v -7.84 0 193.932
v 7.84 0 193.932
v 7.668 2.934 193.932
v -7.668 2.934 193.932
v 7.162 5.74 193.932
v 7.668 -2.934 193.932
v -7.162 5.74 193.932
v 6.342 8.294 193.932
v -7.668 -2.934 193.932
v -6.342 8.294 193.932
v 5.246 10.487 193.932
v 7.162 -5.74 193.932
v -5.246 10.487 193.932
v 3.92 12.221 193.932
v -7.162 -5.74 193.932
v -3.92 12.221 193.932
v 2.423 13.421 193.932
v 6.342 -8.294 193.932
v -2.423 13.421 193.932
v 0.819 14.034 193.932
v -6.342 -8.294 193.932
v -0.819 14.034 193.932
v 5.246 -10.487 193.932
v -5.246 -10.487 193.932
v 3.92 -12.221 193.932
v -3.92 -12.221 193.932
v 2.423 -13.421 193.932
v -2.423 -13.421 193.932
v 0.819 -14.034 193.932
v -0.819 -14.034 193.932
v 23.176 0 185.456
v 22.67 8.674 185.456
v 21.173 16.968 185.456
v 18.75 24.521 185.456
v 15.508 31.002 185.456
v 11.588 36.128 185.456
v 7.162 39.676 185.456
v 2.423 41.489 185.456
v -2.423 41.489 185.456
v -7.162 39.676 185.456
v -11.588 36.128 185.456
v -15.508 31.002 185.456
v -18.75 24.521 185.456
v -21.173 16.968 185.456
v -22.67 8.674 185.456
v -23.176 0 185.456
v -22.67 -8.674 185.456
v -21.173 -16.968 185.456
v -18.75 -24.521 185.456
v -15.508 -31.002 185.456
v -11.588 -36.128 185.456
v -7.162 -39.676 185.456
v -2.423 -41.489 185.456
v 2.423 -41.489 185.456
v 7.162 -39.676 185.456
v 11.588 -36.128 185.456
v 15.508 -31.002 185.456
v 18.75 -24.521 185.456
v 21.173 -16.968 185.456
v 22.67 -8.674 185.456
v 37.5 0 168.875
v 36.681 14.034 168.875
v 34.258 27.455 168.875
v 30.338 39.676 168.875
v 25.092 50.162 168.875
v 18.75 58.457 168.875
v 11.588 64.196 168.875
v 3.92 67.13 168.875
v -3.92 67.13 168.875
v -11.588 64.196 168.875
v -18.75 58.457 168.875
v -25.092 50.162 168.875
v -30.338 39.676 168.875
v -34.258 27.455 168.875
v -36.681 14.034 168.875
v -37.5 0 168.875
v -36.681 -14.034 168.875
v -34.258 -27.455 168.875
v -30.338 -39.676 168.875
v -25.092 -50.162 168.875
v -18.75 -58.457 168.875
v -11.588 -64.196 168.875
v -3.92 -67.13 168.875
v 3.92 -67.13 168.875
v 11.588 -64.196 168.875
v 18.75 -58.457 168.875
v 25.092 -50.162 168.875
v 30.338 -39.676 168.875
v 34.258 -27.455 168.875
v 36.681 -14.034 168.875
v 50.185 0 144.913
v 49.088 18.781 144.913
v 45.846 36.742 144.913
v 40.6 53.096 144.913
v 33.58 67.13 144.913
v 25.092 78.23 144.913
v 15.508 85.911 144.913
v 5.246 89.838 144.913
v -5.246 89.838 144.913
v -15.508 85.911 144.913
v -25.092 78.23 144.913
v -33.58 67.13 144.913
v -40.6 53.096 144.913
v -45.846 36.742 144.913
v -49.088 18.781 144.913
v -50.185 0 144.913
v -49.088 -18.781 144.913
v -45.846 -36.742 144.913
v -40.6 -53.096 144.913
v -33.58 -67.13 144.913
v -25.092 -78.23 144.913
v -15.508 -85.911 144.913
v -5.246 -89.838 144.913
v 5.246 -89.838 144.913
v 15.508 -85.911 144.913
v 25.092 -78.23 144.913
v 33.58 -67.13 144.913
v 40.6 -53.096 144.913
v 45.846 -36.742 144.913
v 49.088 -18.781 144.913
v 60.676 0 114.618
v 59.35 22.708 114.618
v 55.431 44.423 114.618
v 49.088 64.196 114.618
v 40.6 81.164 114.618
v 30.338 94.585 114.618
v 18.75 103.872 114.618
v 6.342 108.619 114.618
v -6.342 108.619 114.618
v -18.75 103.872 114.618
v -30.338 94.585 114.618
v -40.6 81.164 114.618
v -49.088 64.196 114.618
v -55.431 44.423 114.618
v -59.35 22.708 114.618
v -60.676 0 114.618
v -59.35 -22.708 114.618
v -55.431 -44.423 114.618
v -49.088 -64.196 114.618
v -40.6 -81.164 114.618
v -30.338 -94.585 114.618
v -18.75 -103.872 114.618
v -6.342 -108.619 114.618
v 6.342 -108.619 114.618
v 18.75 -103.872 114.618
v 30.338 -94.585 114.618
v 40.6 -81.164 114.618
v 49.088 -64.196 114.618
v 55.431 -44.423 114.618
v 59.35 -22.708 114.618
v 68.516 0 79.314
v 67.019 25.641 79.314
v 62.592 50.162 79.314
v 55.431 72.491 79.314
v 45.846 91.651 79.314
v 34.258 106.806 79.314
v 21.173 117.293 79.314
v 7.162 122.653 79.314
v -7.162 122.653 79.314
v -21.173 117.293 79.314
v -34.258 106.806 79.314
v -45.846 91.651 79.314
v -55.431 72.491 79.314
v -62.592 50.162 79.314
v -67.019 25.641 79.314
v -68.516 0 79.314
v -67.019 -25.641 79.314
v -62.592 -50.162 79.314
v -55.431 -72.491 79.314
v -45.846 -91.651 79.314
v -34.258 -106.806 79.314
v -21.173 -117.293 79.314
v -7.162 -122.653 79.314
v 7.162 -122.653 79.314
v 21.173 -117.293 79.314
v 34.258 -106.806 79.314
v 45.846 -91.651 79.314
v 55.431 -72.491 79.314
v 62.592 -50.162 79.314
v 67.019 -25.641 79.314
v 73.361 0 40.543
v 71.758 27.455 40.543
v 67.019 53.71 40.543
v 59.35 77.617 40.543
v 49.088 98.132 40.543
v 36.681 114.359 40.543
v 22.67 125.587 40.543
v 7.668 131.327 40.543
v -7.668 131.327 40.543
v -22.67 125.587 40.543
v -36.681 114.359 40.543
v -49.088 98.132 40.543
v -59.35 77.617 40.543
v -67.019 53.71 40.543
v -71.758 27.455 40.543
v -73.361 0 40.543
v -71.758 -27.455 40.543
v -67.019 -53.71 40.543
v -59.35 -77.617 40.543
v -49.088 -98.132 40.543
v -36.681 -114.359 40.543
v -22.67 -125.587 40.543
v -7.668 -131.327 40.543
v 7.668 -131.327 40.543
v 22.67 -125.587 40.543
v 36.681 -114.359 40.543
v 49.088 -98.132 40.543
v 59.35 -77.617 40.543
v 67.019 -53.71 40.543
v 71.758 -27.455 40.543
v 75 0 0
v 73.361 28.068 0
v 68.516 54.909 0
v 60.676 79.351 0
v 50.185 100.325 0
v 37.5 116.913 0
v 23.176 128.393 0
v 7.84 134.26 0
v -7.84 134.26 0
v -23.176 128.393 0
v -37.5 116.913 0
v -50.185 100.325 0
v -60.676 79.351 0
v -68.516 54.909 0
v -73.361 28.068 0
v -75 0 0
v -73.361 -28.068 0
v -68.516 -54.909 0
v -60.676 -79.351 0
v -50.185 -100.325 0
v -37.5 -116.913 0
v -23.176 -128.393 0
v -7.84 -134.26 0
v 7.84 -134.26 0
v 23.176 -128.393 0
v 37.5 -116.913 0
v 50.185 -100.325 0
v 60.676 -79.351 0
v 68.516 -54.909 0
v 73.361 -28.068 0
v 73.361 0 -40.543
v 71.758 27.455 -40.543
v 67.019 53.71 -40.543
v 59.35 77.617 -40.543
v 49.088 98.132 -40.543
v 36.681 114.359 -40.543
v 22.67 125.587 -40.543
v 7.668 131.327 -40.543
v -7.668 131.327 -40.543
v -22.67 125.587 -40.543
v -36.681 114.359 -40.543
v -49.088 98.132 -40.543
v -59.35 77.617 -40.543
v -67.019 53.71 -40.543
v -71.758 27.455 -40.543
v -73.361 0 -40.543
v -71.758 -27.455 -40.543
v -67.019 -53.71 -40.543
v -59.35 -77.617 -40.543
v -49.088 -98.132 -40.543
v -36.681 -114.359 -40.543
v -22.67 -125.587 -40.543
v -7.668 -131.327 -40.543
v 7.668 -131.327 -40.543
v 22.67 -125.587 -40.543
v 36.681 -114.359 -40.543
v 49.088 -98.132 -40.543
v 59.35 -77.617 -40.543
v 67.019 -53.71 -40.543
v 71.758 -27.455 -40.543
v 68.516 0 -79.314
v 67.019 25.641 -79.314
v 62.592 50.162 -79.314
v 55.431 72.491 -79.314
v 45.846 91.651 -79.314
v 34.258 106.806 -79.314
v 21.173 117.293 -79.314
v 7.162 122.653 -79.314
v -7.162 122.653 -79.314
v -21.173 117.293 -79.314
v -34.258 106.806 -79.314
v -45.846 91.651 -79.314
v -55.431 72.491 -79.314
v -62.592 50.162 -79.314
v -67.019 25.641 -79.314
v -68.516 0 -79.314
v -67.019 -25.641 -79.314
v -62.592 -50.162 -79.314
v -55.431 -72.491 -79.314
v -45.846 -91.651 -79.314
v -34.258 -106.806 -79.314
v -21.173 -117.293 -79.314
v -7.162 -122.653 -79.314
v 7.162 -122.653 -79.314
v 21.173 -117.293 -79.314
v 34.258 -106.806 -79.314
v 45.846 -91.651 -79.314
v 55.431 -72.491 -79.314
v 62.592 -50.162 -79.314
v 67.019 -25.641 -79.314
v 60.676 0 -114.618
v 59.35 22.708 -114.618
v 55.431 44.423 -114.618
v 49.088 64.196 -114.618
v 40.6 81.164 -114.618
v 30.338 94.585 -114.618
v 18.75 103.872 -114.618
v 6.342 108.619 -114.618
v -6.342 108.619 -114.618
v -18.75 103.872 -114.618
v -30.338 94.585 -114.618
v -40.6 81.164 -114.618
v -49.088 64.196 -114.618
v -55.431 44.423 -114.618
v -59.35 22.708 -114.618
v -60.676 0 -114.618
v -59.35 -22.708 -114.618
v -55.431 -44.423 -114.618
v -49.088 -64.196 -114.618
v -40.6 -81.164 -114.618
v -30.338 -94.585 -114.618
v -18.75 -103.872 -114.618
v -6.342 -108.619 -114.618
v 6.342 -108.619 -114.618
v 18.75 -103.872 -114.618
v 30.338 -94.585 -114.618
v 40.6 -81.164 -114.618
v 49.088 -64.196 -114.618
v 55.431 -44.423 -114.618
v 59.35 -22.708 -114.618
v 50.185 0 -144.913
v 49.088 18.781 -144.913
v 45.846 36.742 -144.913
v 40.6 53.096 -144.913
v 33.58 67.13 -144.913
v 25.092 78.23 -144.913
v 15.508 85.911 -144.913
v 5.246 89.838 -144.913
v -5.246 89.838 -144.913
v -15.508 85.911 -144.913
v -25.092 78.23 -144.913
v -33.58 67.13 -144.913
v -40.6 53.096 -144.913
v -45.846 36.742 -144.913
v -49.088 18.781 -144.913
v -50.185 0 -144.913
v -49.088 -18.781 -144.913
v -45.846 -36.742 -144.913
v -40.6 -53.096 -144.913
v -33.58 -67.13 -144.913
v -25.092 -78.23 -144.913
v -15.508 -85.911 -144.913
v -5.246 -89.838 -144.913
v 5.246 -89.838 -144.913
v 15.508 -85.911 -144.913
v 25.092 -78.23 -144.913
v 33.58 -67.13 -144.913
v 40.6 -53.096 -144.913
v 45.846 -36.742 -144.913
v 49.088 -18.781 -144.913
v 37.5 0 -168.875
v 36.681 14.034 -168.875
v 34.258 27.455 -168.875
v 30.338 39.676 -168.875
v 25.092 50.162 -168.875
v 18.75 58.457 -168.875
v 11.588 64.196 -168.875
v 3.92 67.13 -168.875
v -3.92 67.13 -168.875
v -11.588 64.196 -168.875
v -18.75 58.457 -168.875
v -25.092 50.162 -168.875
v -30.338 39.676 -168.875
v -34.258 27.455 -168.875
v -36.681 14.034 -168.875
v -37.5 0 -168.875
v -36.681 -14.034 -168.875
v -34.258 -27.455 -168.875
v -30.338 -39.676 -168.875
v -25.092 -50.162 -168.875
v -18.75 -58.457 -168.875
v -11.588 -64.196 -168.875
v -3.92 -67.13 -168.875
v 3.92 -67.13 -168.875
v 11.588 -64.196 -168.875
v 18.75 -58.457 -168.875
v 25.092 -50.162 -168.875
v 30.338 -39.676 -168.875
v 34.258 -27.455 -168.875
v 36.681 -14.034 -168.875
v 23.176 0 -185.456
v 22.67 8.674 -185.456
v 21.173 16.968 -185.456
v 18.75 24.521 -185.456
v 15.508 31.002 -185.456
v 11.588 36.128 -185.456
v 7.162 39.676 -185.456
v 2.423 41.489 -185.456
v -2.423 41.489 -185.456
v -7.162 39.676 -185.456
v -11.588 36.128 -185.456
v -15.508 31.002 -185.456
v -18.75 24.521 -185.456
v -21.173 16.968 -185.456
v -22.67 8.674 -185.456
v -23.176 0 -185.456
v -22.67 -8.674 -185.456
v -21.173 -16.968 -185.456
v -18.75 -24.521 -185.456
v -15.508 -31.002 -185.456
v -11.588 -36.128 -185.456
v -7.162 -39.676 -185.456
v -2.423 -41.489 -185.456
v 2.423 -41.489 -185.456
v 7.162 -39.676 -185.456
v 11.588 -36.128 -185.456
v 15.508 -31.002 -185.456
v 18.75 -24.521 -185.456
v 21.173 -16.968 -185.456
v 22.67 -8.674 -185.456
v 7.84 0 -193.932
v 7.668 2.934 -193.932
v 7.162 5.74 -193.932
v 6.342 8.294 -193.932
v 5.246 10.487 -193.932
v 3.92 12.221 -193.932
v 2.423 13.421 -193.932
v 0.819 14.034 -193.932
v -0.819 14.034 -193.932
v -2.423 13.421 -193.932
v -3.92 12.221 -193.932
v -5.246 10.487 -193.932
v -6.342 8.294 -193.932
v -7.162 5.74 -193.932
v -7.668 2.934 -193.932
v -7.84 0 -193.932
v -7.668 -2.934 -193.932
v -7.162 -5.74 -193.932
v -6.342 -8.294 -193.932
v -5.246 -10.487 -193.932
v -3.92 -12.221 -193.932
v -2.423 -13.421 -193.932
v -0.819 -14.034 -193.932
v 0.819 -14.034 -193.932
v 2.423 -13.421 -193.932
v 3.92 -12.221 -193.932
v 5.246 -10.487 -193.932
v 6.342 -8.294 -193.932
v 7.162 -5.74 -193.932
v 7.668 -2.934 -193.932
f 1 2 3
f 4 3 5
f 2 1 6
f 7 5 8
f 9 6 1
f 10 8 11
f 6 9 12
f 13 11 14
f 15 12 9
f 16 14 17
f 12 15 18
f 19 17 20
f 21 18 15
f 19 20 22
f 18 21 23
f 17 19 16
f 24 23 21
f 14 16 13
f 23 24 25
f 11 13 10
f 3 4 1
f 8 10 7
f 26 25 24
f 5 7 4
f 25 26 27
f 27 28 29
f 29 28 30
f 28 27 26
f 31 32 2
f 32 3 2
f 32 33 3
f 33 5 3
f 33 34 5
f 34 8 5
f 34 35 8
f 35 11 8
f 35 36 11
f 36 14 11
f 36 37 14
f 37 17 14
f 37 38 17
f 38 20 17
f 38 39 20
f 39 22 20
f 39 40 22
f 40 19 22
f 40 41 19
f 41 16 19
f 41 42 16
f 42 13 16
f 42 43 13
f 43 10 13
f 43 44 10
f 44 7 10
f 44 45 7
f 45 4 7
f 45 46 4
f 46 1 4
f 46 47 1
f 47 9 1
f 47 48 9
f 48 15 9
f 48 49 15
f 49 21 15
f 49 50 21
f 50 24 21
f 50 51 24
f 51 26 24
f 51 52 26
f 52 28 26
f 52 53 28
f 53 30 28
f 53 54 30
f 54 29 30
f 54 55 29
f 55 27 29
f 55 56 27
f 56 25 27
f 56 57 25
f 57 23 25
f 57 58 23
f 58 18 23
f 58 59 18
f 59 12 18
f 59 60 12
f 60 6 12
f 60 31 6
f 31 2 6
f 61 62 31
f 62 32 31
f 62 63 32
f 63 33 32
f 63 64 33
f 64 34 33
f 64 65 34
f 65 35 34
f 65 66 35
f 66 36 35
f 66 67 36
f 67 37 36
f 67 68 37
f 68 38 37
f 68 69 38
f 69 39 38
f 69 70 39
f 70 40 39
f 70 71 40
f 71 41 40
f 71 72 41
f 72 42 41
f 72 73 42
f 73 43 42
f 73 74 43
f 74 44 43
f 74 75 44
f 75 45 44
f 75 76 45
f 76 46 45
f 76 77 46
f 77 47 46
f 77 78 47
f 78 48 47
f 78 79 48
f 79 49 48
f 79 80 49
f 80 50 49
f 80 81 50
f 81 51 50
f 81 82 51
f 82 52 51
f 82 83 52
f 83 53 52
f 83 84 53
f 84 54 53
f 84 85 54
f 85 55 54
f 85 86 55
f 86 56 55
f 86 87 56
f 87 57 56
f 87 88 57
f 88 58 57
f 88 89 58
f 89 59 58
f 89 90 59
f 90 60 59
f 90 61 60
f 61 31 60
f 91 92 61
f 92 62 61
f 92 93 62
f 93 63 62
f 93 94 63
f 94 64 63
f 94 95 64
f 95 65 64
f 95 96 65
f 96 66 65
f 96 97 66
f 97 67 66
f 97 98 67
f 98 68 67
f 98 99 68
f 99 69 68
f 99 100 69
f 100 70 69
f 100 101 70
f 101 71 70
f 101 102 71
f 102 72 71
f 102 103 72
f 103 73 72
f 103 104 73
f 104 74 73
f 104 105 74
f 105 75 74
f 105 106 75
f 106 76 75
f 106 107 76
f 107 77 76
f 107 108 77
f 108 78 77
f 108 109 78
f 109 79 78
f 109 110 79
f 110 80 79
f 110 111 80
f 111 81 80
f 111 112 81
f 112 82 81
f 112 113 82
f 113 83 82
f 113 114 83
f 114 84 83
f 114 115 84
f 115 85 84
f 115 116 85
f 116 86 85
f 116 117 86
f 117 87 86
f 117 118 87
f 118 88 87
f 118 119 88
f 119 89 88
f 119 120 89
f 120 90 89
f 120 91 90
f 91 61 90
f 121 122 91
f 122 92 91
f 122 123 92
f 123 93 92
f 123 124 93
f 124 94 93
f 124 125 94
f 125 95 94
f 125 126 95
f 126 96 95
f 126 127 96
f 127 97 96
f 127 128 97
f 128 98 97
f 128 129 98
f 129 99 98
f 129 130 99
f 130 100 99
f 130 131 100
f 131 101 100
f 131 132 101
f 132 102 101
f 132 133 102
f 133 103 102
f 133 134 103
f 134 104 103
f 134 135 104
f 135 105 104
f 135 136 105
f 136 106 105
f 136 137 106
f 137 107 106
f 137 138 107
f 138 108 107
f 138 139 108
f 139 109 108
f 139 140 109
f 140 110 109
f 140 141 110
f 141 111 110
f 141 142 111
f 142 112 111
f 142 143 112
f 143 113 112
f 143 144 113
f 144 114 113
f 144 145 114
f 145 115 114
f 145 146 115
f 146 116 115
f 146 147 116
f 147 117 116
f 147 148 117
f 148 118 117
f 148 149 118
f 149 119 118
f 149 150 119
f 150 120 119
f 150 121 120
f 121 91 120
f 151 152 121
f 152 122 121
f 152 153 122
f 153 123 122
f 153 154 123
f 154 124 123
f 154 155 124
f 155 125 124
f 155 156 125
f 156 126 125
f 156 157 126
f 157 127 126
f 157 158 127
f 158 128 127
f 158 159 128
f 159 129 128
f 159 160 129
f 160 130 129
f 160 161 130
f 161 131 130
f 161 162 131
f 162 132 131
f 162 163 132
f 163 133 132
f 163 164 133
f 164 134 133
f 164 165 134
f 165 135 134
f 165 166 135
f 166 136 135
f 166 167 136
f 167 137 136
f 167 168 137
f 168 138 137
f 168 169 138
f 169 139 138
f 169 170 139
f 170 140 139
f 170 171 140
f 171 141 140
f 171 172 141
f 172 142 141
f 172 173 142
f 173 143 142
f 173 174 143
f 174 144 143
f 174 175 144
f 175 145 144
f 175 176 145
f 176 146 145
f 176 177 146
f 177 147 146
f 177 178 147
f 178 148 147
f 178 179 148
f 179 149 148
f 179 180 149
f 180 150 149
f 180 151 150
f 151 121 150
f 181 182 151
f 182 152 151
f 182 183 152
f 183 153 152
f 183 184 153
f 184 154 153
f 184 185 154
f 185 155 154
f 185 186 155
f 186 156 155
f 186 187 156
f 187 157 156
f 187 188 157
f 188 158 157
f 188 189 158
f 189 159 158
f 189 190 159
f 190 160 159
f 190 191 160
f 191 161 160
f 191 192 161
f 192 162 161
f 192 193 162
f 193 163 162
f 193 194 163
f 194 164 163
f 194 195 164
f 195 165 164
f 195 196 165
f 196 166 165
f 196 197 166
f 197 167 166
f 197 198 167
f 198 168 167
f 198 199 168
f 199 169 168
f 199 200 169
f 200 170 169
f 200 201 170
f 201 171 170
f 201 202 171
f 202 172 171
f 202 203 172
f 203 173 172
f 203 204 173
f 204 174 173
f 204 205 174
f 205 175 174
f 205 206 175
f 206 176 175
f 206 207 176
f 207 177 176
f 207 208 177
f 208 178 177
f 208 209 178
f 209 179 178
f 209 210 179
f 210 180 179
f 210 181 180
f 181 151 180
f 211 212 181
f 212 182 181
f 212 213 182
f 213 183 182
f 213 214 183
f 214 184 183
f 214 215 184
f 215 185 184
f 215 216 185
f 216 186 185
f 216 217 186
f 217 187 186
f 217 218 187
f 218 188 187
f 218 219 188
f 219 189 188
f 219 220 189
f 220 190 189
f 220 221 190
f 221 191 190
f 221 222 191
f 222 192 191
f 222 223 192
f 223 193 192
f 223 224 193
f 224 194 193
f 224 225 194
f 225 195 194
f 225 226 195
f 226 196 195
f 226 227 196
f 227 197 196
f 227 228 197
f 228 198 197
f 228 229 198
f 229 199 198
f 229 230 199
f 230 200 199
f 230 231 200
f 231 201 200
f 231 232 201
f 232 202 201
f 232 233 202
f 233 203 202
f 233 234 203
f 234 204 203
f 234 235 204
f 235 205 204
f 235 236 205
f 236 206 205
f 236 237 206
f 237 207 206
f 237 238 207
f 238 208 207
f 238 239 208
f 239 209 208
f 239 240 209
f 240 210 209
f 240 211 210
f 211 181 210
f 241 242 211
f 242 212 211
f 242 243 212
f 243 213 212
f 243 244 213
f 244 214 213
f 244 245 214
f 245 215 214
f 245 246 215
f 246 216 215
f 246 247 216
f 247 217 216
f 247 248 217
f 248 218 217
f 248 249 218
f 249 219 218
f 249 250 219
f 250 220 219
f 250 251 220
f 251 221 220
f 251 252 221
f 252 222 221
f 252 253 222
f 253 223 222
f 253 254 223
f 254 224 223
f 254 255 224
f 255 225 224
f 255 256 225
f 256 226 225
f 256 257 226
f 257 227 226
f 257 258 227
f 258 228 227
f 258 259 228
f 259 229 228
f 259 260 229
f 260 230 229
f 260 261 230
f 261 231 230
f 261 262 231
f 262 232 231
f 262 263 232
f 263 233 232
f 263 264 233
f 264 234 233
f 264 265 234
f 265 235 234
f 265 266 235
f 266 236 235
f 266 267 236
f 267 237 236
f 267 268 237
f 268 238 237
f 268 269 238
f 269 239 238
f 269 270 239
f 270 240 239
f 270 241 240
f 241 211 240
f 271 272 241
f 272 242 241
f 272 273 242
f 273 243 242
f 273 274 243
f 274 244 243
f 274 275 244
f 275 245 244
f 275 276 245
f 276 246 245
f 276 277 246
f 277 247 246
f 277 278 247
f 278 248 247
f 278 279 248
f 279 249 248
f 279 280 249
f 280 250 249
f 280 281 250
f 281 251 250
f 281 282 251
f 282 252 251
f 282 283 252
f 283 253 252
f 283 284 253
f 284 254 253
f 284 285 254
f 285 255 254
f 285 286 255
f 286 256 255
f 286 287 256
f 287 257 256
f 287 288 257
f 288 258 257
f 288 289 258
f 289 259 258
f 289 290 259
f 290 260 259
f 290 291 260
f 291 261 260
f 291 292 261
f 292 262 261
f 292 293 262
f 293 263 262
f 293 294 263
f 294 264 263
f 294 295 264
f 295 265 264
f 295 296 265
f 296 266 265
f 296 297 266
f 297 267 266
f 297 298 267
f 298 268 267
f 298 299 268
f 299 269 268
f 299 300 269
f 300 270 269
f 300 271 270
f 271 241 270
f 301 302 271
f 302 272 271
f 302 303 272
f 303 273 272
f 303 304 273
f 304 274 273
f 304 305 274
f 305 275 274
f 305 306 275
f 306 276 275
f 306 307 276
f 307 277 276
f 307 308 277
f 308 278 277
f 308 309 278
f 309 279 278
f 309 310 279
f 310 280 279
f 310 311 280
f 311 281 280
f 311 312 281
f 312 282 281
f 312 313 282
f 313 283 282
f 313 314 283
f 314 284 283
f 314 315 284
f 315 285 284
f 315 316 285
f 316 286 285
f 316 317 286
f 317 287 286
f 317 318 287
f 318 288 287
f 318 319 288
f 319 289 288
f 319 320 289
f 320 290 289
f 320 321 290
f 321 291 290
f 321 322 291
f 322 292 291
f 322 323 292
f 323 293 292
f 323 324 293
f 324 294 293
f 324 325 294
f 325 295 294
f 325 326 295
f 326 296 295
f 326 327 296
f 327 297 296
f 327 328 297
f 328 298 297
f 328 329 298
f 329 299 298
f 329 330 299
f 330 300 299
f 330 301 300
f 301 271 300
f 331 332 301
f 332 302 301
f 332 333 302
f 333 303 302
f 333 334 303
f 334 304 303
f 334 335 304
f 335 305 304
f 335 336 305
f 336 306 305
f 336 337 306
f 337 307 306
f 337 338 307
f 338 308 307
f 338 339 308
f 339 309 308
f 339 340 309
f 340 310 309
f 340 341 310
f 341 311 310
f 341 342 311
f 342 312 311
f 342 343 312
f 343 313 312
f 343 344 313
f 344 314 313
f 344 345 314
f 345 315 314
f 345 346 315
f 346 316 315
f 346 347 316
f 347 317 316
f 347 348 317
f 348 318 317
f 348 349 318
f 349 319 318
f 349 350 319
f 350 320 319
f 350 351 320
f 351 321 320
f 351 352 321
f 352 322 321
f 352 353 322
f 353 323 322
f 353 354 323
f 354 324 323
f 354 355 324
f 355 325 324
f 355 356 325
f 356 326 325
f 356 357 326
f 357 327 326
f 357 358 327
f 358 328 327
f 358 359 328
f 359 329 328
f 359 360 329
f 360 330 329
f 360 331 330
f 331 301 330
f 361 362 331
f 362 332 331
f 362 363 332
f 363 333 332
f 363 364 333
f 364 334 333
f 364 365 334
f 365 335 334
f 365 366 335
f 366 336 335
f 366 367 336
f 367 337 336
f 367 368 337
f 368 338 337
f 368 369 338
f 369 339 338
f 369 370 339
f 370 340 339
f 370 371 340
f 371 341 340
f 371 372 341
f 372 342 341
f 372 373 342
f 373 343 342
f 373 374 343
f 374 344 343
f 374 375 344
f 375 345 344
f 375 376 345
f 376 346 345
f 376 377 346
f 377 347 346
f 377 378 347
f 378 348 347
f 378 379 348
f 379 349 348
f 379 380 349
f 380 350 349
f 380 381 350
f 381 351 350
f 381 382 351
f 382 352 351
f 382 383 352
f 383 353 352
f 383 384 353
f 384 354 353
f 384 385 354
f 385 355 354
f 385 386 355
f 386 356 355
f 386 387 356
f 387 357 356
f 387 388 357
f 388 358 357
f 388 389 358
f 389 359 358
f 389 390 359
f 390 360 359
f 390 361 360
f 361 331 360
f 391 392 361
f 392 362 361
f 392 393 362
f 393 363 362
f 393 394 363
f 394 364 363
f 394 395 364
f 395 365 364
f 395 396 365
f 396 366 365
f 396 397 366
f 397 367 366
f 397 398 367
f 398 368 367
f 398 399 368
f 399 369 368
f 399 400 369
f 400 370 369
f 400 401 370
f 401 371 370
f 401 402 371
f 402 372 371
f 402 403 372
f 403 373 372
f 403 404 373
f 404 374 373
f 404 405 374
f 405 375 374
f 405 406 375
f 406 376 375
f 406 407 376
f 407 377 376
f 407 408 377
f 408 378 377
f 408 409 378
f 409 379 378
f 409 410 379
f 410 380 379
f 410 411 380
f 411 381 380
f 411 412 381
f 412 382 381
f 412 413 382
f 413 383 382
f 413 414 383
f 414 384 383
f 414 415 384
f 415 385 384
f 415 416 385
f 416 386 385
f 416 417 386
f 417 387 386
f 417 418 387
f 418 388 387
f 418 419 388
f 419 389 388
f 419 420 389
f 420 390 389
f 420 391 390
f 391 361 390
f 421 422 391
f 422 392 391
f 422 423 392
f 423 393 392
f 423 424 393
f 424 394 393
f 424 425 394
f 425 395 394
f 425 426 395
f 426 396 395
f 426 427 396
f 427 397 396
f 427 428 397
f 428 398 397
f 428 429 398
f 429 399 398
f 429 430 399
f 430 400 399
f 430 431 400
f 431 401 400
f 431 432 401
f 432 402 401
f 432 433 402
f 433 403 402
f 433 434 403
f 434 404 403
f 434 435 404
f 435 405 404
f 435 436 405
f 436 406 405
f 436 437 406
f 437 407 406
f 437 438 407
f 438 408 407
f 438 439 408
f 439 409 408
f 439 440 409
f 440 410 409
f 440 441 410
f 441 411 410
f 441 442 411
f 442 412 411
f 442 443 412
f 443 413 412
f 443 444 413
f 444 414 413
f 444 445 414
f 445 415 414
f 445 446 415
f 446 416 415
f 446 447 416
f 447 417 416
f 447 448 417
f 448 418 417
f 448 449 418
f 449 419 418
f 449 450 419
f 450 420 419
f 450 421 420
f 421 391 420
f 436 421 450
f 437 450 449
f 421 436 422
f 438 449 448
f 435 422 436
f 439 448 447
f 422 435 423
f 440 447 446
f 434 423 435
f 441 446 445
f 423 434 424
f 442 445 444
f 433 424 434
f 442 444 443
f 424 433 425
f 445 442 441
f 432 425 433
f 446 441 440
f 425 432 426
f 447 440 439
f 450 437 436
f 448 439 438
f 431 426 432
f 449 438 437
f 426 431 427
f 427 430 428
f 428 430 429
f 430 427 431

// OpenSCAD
// Generated by SolidPython 1.0.1 on 2020-07-29 00:39:26


scale(v = [5, 9, 13]) {
	sphere(r = 15);
}
/***********************************************
*********      SolidPython code:      **********
************************************************
 
# import packages: SolidPython
from solid import *
from solid.utils import *
from itertools import chain, combinations


class Resize:

    def __init__(self, scad_file):
        self.scad_file = scad_file
        #self.scad_file = import_scad(scad_file)
        # cone/cylinder param:
        self.r1 = 0
        self.r2 = 0
        self.h = 0
        # rectangular prism param:
        self.w = 0
        self.l = 0
        # ellipse param:
        self.r = 0

    # import OpenScad code (file name corresponds to shape)


    # classify shape + parameters
    def assign(self, param1, param2, param3):
        if self.scad_file == 'cone.scad':
            self.r1 = param1
            self.r2 = param2
            self.h = param3
        elif self.scad_file == 'cylinder.scad':
            self.r1 = param1
            self.r2 = param2
            self.h = param3
        elif self.scad_file == 'rectangularPrism.scad':
            self.h = param1
            self.l = param2
            self.w = param3
        else:
            self.r = param1
            self.h = param2

    # resize parameters
    def iterate(self):
        x = range(3, 20, 2)
        i = 1
        if self.scad_file == 'cone.scad':
            tempList = list(combinations(x, 2))
            for temp in tempList:
                param1 = temp[0]
                param2 = temp[1]
                filepath = 'produced_scad_files/' + 'cone' + str(param1) + '_' + str(param2) + '_' + '.scad'
                scad_render_to_file(cylinder(h=param1, r1=param2, r2=0), filepath)

        elif self.scad_file == 'cylinder.scad':
            tempList = list(combinations(x, 3))
            for temp in tempList:
                param1 = temp[0]
                param2 = temp[1]
                filepath = 'produced_scad_files/' + 'cylinder' + str(param1) + '_' + str(param2) + '_' + '.scad'
                scad_render_to_file(cylinder(h=param1, r1=param2, r2=param2), filepath)

        elif self.scad_file == 'rectangularPrism.scad':
            tempList = list(combinations(x, 3))
            for temp in tempList:
                param1 = temp[0]
                param2 = temp[1]
                param3 = temp[2]
                filepath = 'produced_scad_files/' + 'rectangularPrism' + str(param1) + '_' + str(param2) + '_' + str(
                    param3) + '.scad'
                scad_render_to_file(cube(size=(param1, param2, param3)), filepath)

        elif self.scad_file == 'ellipse.scad':
            tempList = list(combinations(x, 4))
            for temp in tempList:
                param1 = temp[0]
                param2 = temp[1]
                param3 = temp[2]
                param4 = temp[3]
                filepath = 'produced_scad_files/' + 'ellipse' + str(param1) + '_' + str(param2) + '_' + str(param3) + '_' + str(param4) + '.scad'
                scad_render_to_file(scale([param1, param2, param3])(sphere(r=param4)), filepath)

    def render_to_scadfile(self):
        scad_render_to_file(scad, 'example.scad') 
 
************************************************/
